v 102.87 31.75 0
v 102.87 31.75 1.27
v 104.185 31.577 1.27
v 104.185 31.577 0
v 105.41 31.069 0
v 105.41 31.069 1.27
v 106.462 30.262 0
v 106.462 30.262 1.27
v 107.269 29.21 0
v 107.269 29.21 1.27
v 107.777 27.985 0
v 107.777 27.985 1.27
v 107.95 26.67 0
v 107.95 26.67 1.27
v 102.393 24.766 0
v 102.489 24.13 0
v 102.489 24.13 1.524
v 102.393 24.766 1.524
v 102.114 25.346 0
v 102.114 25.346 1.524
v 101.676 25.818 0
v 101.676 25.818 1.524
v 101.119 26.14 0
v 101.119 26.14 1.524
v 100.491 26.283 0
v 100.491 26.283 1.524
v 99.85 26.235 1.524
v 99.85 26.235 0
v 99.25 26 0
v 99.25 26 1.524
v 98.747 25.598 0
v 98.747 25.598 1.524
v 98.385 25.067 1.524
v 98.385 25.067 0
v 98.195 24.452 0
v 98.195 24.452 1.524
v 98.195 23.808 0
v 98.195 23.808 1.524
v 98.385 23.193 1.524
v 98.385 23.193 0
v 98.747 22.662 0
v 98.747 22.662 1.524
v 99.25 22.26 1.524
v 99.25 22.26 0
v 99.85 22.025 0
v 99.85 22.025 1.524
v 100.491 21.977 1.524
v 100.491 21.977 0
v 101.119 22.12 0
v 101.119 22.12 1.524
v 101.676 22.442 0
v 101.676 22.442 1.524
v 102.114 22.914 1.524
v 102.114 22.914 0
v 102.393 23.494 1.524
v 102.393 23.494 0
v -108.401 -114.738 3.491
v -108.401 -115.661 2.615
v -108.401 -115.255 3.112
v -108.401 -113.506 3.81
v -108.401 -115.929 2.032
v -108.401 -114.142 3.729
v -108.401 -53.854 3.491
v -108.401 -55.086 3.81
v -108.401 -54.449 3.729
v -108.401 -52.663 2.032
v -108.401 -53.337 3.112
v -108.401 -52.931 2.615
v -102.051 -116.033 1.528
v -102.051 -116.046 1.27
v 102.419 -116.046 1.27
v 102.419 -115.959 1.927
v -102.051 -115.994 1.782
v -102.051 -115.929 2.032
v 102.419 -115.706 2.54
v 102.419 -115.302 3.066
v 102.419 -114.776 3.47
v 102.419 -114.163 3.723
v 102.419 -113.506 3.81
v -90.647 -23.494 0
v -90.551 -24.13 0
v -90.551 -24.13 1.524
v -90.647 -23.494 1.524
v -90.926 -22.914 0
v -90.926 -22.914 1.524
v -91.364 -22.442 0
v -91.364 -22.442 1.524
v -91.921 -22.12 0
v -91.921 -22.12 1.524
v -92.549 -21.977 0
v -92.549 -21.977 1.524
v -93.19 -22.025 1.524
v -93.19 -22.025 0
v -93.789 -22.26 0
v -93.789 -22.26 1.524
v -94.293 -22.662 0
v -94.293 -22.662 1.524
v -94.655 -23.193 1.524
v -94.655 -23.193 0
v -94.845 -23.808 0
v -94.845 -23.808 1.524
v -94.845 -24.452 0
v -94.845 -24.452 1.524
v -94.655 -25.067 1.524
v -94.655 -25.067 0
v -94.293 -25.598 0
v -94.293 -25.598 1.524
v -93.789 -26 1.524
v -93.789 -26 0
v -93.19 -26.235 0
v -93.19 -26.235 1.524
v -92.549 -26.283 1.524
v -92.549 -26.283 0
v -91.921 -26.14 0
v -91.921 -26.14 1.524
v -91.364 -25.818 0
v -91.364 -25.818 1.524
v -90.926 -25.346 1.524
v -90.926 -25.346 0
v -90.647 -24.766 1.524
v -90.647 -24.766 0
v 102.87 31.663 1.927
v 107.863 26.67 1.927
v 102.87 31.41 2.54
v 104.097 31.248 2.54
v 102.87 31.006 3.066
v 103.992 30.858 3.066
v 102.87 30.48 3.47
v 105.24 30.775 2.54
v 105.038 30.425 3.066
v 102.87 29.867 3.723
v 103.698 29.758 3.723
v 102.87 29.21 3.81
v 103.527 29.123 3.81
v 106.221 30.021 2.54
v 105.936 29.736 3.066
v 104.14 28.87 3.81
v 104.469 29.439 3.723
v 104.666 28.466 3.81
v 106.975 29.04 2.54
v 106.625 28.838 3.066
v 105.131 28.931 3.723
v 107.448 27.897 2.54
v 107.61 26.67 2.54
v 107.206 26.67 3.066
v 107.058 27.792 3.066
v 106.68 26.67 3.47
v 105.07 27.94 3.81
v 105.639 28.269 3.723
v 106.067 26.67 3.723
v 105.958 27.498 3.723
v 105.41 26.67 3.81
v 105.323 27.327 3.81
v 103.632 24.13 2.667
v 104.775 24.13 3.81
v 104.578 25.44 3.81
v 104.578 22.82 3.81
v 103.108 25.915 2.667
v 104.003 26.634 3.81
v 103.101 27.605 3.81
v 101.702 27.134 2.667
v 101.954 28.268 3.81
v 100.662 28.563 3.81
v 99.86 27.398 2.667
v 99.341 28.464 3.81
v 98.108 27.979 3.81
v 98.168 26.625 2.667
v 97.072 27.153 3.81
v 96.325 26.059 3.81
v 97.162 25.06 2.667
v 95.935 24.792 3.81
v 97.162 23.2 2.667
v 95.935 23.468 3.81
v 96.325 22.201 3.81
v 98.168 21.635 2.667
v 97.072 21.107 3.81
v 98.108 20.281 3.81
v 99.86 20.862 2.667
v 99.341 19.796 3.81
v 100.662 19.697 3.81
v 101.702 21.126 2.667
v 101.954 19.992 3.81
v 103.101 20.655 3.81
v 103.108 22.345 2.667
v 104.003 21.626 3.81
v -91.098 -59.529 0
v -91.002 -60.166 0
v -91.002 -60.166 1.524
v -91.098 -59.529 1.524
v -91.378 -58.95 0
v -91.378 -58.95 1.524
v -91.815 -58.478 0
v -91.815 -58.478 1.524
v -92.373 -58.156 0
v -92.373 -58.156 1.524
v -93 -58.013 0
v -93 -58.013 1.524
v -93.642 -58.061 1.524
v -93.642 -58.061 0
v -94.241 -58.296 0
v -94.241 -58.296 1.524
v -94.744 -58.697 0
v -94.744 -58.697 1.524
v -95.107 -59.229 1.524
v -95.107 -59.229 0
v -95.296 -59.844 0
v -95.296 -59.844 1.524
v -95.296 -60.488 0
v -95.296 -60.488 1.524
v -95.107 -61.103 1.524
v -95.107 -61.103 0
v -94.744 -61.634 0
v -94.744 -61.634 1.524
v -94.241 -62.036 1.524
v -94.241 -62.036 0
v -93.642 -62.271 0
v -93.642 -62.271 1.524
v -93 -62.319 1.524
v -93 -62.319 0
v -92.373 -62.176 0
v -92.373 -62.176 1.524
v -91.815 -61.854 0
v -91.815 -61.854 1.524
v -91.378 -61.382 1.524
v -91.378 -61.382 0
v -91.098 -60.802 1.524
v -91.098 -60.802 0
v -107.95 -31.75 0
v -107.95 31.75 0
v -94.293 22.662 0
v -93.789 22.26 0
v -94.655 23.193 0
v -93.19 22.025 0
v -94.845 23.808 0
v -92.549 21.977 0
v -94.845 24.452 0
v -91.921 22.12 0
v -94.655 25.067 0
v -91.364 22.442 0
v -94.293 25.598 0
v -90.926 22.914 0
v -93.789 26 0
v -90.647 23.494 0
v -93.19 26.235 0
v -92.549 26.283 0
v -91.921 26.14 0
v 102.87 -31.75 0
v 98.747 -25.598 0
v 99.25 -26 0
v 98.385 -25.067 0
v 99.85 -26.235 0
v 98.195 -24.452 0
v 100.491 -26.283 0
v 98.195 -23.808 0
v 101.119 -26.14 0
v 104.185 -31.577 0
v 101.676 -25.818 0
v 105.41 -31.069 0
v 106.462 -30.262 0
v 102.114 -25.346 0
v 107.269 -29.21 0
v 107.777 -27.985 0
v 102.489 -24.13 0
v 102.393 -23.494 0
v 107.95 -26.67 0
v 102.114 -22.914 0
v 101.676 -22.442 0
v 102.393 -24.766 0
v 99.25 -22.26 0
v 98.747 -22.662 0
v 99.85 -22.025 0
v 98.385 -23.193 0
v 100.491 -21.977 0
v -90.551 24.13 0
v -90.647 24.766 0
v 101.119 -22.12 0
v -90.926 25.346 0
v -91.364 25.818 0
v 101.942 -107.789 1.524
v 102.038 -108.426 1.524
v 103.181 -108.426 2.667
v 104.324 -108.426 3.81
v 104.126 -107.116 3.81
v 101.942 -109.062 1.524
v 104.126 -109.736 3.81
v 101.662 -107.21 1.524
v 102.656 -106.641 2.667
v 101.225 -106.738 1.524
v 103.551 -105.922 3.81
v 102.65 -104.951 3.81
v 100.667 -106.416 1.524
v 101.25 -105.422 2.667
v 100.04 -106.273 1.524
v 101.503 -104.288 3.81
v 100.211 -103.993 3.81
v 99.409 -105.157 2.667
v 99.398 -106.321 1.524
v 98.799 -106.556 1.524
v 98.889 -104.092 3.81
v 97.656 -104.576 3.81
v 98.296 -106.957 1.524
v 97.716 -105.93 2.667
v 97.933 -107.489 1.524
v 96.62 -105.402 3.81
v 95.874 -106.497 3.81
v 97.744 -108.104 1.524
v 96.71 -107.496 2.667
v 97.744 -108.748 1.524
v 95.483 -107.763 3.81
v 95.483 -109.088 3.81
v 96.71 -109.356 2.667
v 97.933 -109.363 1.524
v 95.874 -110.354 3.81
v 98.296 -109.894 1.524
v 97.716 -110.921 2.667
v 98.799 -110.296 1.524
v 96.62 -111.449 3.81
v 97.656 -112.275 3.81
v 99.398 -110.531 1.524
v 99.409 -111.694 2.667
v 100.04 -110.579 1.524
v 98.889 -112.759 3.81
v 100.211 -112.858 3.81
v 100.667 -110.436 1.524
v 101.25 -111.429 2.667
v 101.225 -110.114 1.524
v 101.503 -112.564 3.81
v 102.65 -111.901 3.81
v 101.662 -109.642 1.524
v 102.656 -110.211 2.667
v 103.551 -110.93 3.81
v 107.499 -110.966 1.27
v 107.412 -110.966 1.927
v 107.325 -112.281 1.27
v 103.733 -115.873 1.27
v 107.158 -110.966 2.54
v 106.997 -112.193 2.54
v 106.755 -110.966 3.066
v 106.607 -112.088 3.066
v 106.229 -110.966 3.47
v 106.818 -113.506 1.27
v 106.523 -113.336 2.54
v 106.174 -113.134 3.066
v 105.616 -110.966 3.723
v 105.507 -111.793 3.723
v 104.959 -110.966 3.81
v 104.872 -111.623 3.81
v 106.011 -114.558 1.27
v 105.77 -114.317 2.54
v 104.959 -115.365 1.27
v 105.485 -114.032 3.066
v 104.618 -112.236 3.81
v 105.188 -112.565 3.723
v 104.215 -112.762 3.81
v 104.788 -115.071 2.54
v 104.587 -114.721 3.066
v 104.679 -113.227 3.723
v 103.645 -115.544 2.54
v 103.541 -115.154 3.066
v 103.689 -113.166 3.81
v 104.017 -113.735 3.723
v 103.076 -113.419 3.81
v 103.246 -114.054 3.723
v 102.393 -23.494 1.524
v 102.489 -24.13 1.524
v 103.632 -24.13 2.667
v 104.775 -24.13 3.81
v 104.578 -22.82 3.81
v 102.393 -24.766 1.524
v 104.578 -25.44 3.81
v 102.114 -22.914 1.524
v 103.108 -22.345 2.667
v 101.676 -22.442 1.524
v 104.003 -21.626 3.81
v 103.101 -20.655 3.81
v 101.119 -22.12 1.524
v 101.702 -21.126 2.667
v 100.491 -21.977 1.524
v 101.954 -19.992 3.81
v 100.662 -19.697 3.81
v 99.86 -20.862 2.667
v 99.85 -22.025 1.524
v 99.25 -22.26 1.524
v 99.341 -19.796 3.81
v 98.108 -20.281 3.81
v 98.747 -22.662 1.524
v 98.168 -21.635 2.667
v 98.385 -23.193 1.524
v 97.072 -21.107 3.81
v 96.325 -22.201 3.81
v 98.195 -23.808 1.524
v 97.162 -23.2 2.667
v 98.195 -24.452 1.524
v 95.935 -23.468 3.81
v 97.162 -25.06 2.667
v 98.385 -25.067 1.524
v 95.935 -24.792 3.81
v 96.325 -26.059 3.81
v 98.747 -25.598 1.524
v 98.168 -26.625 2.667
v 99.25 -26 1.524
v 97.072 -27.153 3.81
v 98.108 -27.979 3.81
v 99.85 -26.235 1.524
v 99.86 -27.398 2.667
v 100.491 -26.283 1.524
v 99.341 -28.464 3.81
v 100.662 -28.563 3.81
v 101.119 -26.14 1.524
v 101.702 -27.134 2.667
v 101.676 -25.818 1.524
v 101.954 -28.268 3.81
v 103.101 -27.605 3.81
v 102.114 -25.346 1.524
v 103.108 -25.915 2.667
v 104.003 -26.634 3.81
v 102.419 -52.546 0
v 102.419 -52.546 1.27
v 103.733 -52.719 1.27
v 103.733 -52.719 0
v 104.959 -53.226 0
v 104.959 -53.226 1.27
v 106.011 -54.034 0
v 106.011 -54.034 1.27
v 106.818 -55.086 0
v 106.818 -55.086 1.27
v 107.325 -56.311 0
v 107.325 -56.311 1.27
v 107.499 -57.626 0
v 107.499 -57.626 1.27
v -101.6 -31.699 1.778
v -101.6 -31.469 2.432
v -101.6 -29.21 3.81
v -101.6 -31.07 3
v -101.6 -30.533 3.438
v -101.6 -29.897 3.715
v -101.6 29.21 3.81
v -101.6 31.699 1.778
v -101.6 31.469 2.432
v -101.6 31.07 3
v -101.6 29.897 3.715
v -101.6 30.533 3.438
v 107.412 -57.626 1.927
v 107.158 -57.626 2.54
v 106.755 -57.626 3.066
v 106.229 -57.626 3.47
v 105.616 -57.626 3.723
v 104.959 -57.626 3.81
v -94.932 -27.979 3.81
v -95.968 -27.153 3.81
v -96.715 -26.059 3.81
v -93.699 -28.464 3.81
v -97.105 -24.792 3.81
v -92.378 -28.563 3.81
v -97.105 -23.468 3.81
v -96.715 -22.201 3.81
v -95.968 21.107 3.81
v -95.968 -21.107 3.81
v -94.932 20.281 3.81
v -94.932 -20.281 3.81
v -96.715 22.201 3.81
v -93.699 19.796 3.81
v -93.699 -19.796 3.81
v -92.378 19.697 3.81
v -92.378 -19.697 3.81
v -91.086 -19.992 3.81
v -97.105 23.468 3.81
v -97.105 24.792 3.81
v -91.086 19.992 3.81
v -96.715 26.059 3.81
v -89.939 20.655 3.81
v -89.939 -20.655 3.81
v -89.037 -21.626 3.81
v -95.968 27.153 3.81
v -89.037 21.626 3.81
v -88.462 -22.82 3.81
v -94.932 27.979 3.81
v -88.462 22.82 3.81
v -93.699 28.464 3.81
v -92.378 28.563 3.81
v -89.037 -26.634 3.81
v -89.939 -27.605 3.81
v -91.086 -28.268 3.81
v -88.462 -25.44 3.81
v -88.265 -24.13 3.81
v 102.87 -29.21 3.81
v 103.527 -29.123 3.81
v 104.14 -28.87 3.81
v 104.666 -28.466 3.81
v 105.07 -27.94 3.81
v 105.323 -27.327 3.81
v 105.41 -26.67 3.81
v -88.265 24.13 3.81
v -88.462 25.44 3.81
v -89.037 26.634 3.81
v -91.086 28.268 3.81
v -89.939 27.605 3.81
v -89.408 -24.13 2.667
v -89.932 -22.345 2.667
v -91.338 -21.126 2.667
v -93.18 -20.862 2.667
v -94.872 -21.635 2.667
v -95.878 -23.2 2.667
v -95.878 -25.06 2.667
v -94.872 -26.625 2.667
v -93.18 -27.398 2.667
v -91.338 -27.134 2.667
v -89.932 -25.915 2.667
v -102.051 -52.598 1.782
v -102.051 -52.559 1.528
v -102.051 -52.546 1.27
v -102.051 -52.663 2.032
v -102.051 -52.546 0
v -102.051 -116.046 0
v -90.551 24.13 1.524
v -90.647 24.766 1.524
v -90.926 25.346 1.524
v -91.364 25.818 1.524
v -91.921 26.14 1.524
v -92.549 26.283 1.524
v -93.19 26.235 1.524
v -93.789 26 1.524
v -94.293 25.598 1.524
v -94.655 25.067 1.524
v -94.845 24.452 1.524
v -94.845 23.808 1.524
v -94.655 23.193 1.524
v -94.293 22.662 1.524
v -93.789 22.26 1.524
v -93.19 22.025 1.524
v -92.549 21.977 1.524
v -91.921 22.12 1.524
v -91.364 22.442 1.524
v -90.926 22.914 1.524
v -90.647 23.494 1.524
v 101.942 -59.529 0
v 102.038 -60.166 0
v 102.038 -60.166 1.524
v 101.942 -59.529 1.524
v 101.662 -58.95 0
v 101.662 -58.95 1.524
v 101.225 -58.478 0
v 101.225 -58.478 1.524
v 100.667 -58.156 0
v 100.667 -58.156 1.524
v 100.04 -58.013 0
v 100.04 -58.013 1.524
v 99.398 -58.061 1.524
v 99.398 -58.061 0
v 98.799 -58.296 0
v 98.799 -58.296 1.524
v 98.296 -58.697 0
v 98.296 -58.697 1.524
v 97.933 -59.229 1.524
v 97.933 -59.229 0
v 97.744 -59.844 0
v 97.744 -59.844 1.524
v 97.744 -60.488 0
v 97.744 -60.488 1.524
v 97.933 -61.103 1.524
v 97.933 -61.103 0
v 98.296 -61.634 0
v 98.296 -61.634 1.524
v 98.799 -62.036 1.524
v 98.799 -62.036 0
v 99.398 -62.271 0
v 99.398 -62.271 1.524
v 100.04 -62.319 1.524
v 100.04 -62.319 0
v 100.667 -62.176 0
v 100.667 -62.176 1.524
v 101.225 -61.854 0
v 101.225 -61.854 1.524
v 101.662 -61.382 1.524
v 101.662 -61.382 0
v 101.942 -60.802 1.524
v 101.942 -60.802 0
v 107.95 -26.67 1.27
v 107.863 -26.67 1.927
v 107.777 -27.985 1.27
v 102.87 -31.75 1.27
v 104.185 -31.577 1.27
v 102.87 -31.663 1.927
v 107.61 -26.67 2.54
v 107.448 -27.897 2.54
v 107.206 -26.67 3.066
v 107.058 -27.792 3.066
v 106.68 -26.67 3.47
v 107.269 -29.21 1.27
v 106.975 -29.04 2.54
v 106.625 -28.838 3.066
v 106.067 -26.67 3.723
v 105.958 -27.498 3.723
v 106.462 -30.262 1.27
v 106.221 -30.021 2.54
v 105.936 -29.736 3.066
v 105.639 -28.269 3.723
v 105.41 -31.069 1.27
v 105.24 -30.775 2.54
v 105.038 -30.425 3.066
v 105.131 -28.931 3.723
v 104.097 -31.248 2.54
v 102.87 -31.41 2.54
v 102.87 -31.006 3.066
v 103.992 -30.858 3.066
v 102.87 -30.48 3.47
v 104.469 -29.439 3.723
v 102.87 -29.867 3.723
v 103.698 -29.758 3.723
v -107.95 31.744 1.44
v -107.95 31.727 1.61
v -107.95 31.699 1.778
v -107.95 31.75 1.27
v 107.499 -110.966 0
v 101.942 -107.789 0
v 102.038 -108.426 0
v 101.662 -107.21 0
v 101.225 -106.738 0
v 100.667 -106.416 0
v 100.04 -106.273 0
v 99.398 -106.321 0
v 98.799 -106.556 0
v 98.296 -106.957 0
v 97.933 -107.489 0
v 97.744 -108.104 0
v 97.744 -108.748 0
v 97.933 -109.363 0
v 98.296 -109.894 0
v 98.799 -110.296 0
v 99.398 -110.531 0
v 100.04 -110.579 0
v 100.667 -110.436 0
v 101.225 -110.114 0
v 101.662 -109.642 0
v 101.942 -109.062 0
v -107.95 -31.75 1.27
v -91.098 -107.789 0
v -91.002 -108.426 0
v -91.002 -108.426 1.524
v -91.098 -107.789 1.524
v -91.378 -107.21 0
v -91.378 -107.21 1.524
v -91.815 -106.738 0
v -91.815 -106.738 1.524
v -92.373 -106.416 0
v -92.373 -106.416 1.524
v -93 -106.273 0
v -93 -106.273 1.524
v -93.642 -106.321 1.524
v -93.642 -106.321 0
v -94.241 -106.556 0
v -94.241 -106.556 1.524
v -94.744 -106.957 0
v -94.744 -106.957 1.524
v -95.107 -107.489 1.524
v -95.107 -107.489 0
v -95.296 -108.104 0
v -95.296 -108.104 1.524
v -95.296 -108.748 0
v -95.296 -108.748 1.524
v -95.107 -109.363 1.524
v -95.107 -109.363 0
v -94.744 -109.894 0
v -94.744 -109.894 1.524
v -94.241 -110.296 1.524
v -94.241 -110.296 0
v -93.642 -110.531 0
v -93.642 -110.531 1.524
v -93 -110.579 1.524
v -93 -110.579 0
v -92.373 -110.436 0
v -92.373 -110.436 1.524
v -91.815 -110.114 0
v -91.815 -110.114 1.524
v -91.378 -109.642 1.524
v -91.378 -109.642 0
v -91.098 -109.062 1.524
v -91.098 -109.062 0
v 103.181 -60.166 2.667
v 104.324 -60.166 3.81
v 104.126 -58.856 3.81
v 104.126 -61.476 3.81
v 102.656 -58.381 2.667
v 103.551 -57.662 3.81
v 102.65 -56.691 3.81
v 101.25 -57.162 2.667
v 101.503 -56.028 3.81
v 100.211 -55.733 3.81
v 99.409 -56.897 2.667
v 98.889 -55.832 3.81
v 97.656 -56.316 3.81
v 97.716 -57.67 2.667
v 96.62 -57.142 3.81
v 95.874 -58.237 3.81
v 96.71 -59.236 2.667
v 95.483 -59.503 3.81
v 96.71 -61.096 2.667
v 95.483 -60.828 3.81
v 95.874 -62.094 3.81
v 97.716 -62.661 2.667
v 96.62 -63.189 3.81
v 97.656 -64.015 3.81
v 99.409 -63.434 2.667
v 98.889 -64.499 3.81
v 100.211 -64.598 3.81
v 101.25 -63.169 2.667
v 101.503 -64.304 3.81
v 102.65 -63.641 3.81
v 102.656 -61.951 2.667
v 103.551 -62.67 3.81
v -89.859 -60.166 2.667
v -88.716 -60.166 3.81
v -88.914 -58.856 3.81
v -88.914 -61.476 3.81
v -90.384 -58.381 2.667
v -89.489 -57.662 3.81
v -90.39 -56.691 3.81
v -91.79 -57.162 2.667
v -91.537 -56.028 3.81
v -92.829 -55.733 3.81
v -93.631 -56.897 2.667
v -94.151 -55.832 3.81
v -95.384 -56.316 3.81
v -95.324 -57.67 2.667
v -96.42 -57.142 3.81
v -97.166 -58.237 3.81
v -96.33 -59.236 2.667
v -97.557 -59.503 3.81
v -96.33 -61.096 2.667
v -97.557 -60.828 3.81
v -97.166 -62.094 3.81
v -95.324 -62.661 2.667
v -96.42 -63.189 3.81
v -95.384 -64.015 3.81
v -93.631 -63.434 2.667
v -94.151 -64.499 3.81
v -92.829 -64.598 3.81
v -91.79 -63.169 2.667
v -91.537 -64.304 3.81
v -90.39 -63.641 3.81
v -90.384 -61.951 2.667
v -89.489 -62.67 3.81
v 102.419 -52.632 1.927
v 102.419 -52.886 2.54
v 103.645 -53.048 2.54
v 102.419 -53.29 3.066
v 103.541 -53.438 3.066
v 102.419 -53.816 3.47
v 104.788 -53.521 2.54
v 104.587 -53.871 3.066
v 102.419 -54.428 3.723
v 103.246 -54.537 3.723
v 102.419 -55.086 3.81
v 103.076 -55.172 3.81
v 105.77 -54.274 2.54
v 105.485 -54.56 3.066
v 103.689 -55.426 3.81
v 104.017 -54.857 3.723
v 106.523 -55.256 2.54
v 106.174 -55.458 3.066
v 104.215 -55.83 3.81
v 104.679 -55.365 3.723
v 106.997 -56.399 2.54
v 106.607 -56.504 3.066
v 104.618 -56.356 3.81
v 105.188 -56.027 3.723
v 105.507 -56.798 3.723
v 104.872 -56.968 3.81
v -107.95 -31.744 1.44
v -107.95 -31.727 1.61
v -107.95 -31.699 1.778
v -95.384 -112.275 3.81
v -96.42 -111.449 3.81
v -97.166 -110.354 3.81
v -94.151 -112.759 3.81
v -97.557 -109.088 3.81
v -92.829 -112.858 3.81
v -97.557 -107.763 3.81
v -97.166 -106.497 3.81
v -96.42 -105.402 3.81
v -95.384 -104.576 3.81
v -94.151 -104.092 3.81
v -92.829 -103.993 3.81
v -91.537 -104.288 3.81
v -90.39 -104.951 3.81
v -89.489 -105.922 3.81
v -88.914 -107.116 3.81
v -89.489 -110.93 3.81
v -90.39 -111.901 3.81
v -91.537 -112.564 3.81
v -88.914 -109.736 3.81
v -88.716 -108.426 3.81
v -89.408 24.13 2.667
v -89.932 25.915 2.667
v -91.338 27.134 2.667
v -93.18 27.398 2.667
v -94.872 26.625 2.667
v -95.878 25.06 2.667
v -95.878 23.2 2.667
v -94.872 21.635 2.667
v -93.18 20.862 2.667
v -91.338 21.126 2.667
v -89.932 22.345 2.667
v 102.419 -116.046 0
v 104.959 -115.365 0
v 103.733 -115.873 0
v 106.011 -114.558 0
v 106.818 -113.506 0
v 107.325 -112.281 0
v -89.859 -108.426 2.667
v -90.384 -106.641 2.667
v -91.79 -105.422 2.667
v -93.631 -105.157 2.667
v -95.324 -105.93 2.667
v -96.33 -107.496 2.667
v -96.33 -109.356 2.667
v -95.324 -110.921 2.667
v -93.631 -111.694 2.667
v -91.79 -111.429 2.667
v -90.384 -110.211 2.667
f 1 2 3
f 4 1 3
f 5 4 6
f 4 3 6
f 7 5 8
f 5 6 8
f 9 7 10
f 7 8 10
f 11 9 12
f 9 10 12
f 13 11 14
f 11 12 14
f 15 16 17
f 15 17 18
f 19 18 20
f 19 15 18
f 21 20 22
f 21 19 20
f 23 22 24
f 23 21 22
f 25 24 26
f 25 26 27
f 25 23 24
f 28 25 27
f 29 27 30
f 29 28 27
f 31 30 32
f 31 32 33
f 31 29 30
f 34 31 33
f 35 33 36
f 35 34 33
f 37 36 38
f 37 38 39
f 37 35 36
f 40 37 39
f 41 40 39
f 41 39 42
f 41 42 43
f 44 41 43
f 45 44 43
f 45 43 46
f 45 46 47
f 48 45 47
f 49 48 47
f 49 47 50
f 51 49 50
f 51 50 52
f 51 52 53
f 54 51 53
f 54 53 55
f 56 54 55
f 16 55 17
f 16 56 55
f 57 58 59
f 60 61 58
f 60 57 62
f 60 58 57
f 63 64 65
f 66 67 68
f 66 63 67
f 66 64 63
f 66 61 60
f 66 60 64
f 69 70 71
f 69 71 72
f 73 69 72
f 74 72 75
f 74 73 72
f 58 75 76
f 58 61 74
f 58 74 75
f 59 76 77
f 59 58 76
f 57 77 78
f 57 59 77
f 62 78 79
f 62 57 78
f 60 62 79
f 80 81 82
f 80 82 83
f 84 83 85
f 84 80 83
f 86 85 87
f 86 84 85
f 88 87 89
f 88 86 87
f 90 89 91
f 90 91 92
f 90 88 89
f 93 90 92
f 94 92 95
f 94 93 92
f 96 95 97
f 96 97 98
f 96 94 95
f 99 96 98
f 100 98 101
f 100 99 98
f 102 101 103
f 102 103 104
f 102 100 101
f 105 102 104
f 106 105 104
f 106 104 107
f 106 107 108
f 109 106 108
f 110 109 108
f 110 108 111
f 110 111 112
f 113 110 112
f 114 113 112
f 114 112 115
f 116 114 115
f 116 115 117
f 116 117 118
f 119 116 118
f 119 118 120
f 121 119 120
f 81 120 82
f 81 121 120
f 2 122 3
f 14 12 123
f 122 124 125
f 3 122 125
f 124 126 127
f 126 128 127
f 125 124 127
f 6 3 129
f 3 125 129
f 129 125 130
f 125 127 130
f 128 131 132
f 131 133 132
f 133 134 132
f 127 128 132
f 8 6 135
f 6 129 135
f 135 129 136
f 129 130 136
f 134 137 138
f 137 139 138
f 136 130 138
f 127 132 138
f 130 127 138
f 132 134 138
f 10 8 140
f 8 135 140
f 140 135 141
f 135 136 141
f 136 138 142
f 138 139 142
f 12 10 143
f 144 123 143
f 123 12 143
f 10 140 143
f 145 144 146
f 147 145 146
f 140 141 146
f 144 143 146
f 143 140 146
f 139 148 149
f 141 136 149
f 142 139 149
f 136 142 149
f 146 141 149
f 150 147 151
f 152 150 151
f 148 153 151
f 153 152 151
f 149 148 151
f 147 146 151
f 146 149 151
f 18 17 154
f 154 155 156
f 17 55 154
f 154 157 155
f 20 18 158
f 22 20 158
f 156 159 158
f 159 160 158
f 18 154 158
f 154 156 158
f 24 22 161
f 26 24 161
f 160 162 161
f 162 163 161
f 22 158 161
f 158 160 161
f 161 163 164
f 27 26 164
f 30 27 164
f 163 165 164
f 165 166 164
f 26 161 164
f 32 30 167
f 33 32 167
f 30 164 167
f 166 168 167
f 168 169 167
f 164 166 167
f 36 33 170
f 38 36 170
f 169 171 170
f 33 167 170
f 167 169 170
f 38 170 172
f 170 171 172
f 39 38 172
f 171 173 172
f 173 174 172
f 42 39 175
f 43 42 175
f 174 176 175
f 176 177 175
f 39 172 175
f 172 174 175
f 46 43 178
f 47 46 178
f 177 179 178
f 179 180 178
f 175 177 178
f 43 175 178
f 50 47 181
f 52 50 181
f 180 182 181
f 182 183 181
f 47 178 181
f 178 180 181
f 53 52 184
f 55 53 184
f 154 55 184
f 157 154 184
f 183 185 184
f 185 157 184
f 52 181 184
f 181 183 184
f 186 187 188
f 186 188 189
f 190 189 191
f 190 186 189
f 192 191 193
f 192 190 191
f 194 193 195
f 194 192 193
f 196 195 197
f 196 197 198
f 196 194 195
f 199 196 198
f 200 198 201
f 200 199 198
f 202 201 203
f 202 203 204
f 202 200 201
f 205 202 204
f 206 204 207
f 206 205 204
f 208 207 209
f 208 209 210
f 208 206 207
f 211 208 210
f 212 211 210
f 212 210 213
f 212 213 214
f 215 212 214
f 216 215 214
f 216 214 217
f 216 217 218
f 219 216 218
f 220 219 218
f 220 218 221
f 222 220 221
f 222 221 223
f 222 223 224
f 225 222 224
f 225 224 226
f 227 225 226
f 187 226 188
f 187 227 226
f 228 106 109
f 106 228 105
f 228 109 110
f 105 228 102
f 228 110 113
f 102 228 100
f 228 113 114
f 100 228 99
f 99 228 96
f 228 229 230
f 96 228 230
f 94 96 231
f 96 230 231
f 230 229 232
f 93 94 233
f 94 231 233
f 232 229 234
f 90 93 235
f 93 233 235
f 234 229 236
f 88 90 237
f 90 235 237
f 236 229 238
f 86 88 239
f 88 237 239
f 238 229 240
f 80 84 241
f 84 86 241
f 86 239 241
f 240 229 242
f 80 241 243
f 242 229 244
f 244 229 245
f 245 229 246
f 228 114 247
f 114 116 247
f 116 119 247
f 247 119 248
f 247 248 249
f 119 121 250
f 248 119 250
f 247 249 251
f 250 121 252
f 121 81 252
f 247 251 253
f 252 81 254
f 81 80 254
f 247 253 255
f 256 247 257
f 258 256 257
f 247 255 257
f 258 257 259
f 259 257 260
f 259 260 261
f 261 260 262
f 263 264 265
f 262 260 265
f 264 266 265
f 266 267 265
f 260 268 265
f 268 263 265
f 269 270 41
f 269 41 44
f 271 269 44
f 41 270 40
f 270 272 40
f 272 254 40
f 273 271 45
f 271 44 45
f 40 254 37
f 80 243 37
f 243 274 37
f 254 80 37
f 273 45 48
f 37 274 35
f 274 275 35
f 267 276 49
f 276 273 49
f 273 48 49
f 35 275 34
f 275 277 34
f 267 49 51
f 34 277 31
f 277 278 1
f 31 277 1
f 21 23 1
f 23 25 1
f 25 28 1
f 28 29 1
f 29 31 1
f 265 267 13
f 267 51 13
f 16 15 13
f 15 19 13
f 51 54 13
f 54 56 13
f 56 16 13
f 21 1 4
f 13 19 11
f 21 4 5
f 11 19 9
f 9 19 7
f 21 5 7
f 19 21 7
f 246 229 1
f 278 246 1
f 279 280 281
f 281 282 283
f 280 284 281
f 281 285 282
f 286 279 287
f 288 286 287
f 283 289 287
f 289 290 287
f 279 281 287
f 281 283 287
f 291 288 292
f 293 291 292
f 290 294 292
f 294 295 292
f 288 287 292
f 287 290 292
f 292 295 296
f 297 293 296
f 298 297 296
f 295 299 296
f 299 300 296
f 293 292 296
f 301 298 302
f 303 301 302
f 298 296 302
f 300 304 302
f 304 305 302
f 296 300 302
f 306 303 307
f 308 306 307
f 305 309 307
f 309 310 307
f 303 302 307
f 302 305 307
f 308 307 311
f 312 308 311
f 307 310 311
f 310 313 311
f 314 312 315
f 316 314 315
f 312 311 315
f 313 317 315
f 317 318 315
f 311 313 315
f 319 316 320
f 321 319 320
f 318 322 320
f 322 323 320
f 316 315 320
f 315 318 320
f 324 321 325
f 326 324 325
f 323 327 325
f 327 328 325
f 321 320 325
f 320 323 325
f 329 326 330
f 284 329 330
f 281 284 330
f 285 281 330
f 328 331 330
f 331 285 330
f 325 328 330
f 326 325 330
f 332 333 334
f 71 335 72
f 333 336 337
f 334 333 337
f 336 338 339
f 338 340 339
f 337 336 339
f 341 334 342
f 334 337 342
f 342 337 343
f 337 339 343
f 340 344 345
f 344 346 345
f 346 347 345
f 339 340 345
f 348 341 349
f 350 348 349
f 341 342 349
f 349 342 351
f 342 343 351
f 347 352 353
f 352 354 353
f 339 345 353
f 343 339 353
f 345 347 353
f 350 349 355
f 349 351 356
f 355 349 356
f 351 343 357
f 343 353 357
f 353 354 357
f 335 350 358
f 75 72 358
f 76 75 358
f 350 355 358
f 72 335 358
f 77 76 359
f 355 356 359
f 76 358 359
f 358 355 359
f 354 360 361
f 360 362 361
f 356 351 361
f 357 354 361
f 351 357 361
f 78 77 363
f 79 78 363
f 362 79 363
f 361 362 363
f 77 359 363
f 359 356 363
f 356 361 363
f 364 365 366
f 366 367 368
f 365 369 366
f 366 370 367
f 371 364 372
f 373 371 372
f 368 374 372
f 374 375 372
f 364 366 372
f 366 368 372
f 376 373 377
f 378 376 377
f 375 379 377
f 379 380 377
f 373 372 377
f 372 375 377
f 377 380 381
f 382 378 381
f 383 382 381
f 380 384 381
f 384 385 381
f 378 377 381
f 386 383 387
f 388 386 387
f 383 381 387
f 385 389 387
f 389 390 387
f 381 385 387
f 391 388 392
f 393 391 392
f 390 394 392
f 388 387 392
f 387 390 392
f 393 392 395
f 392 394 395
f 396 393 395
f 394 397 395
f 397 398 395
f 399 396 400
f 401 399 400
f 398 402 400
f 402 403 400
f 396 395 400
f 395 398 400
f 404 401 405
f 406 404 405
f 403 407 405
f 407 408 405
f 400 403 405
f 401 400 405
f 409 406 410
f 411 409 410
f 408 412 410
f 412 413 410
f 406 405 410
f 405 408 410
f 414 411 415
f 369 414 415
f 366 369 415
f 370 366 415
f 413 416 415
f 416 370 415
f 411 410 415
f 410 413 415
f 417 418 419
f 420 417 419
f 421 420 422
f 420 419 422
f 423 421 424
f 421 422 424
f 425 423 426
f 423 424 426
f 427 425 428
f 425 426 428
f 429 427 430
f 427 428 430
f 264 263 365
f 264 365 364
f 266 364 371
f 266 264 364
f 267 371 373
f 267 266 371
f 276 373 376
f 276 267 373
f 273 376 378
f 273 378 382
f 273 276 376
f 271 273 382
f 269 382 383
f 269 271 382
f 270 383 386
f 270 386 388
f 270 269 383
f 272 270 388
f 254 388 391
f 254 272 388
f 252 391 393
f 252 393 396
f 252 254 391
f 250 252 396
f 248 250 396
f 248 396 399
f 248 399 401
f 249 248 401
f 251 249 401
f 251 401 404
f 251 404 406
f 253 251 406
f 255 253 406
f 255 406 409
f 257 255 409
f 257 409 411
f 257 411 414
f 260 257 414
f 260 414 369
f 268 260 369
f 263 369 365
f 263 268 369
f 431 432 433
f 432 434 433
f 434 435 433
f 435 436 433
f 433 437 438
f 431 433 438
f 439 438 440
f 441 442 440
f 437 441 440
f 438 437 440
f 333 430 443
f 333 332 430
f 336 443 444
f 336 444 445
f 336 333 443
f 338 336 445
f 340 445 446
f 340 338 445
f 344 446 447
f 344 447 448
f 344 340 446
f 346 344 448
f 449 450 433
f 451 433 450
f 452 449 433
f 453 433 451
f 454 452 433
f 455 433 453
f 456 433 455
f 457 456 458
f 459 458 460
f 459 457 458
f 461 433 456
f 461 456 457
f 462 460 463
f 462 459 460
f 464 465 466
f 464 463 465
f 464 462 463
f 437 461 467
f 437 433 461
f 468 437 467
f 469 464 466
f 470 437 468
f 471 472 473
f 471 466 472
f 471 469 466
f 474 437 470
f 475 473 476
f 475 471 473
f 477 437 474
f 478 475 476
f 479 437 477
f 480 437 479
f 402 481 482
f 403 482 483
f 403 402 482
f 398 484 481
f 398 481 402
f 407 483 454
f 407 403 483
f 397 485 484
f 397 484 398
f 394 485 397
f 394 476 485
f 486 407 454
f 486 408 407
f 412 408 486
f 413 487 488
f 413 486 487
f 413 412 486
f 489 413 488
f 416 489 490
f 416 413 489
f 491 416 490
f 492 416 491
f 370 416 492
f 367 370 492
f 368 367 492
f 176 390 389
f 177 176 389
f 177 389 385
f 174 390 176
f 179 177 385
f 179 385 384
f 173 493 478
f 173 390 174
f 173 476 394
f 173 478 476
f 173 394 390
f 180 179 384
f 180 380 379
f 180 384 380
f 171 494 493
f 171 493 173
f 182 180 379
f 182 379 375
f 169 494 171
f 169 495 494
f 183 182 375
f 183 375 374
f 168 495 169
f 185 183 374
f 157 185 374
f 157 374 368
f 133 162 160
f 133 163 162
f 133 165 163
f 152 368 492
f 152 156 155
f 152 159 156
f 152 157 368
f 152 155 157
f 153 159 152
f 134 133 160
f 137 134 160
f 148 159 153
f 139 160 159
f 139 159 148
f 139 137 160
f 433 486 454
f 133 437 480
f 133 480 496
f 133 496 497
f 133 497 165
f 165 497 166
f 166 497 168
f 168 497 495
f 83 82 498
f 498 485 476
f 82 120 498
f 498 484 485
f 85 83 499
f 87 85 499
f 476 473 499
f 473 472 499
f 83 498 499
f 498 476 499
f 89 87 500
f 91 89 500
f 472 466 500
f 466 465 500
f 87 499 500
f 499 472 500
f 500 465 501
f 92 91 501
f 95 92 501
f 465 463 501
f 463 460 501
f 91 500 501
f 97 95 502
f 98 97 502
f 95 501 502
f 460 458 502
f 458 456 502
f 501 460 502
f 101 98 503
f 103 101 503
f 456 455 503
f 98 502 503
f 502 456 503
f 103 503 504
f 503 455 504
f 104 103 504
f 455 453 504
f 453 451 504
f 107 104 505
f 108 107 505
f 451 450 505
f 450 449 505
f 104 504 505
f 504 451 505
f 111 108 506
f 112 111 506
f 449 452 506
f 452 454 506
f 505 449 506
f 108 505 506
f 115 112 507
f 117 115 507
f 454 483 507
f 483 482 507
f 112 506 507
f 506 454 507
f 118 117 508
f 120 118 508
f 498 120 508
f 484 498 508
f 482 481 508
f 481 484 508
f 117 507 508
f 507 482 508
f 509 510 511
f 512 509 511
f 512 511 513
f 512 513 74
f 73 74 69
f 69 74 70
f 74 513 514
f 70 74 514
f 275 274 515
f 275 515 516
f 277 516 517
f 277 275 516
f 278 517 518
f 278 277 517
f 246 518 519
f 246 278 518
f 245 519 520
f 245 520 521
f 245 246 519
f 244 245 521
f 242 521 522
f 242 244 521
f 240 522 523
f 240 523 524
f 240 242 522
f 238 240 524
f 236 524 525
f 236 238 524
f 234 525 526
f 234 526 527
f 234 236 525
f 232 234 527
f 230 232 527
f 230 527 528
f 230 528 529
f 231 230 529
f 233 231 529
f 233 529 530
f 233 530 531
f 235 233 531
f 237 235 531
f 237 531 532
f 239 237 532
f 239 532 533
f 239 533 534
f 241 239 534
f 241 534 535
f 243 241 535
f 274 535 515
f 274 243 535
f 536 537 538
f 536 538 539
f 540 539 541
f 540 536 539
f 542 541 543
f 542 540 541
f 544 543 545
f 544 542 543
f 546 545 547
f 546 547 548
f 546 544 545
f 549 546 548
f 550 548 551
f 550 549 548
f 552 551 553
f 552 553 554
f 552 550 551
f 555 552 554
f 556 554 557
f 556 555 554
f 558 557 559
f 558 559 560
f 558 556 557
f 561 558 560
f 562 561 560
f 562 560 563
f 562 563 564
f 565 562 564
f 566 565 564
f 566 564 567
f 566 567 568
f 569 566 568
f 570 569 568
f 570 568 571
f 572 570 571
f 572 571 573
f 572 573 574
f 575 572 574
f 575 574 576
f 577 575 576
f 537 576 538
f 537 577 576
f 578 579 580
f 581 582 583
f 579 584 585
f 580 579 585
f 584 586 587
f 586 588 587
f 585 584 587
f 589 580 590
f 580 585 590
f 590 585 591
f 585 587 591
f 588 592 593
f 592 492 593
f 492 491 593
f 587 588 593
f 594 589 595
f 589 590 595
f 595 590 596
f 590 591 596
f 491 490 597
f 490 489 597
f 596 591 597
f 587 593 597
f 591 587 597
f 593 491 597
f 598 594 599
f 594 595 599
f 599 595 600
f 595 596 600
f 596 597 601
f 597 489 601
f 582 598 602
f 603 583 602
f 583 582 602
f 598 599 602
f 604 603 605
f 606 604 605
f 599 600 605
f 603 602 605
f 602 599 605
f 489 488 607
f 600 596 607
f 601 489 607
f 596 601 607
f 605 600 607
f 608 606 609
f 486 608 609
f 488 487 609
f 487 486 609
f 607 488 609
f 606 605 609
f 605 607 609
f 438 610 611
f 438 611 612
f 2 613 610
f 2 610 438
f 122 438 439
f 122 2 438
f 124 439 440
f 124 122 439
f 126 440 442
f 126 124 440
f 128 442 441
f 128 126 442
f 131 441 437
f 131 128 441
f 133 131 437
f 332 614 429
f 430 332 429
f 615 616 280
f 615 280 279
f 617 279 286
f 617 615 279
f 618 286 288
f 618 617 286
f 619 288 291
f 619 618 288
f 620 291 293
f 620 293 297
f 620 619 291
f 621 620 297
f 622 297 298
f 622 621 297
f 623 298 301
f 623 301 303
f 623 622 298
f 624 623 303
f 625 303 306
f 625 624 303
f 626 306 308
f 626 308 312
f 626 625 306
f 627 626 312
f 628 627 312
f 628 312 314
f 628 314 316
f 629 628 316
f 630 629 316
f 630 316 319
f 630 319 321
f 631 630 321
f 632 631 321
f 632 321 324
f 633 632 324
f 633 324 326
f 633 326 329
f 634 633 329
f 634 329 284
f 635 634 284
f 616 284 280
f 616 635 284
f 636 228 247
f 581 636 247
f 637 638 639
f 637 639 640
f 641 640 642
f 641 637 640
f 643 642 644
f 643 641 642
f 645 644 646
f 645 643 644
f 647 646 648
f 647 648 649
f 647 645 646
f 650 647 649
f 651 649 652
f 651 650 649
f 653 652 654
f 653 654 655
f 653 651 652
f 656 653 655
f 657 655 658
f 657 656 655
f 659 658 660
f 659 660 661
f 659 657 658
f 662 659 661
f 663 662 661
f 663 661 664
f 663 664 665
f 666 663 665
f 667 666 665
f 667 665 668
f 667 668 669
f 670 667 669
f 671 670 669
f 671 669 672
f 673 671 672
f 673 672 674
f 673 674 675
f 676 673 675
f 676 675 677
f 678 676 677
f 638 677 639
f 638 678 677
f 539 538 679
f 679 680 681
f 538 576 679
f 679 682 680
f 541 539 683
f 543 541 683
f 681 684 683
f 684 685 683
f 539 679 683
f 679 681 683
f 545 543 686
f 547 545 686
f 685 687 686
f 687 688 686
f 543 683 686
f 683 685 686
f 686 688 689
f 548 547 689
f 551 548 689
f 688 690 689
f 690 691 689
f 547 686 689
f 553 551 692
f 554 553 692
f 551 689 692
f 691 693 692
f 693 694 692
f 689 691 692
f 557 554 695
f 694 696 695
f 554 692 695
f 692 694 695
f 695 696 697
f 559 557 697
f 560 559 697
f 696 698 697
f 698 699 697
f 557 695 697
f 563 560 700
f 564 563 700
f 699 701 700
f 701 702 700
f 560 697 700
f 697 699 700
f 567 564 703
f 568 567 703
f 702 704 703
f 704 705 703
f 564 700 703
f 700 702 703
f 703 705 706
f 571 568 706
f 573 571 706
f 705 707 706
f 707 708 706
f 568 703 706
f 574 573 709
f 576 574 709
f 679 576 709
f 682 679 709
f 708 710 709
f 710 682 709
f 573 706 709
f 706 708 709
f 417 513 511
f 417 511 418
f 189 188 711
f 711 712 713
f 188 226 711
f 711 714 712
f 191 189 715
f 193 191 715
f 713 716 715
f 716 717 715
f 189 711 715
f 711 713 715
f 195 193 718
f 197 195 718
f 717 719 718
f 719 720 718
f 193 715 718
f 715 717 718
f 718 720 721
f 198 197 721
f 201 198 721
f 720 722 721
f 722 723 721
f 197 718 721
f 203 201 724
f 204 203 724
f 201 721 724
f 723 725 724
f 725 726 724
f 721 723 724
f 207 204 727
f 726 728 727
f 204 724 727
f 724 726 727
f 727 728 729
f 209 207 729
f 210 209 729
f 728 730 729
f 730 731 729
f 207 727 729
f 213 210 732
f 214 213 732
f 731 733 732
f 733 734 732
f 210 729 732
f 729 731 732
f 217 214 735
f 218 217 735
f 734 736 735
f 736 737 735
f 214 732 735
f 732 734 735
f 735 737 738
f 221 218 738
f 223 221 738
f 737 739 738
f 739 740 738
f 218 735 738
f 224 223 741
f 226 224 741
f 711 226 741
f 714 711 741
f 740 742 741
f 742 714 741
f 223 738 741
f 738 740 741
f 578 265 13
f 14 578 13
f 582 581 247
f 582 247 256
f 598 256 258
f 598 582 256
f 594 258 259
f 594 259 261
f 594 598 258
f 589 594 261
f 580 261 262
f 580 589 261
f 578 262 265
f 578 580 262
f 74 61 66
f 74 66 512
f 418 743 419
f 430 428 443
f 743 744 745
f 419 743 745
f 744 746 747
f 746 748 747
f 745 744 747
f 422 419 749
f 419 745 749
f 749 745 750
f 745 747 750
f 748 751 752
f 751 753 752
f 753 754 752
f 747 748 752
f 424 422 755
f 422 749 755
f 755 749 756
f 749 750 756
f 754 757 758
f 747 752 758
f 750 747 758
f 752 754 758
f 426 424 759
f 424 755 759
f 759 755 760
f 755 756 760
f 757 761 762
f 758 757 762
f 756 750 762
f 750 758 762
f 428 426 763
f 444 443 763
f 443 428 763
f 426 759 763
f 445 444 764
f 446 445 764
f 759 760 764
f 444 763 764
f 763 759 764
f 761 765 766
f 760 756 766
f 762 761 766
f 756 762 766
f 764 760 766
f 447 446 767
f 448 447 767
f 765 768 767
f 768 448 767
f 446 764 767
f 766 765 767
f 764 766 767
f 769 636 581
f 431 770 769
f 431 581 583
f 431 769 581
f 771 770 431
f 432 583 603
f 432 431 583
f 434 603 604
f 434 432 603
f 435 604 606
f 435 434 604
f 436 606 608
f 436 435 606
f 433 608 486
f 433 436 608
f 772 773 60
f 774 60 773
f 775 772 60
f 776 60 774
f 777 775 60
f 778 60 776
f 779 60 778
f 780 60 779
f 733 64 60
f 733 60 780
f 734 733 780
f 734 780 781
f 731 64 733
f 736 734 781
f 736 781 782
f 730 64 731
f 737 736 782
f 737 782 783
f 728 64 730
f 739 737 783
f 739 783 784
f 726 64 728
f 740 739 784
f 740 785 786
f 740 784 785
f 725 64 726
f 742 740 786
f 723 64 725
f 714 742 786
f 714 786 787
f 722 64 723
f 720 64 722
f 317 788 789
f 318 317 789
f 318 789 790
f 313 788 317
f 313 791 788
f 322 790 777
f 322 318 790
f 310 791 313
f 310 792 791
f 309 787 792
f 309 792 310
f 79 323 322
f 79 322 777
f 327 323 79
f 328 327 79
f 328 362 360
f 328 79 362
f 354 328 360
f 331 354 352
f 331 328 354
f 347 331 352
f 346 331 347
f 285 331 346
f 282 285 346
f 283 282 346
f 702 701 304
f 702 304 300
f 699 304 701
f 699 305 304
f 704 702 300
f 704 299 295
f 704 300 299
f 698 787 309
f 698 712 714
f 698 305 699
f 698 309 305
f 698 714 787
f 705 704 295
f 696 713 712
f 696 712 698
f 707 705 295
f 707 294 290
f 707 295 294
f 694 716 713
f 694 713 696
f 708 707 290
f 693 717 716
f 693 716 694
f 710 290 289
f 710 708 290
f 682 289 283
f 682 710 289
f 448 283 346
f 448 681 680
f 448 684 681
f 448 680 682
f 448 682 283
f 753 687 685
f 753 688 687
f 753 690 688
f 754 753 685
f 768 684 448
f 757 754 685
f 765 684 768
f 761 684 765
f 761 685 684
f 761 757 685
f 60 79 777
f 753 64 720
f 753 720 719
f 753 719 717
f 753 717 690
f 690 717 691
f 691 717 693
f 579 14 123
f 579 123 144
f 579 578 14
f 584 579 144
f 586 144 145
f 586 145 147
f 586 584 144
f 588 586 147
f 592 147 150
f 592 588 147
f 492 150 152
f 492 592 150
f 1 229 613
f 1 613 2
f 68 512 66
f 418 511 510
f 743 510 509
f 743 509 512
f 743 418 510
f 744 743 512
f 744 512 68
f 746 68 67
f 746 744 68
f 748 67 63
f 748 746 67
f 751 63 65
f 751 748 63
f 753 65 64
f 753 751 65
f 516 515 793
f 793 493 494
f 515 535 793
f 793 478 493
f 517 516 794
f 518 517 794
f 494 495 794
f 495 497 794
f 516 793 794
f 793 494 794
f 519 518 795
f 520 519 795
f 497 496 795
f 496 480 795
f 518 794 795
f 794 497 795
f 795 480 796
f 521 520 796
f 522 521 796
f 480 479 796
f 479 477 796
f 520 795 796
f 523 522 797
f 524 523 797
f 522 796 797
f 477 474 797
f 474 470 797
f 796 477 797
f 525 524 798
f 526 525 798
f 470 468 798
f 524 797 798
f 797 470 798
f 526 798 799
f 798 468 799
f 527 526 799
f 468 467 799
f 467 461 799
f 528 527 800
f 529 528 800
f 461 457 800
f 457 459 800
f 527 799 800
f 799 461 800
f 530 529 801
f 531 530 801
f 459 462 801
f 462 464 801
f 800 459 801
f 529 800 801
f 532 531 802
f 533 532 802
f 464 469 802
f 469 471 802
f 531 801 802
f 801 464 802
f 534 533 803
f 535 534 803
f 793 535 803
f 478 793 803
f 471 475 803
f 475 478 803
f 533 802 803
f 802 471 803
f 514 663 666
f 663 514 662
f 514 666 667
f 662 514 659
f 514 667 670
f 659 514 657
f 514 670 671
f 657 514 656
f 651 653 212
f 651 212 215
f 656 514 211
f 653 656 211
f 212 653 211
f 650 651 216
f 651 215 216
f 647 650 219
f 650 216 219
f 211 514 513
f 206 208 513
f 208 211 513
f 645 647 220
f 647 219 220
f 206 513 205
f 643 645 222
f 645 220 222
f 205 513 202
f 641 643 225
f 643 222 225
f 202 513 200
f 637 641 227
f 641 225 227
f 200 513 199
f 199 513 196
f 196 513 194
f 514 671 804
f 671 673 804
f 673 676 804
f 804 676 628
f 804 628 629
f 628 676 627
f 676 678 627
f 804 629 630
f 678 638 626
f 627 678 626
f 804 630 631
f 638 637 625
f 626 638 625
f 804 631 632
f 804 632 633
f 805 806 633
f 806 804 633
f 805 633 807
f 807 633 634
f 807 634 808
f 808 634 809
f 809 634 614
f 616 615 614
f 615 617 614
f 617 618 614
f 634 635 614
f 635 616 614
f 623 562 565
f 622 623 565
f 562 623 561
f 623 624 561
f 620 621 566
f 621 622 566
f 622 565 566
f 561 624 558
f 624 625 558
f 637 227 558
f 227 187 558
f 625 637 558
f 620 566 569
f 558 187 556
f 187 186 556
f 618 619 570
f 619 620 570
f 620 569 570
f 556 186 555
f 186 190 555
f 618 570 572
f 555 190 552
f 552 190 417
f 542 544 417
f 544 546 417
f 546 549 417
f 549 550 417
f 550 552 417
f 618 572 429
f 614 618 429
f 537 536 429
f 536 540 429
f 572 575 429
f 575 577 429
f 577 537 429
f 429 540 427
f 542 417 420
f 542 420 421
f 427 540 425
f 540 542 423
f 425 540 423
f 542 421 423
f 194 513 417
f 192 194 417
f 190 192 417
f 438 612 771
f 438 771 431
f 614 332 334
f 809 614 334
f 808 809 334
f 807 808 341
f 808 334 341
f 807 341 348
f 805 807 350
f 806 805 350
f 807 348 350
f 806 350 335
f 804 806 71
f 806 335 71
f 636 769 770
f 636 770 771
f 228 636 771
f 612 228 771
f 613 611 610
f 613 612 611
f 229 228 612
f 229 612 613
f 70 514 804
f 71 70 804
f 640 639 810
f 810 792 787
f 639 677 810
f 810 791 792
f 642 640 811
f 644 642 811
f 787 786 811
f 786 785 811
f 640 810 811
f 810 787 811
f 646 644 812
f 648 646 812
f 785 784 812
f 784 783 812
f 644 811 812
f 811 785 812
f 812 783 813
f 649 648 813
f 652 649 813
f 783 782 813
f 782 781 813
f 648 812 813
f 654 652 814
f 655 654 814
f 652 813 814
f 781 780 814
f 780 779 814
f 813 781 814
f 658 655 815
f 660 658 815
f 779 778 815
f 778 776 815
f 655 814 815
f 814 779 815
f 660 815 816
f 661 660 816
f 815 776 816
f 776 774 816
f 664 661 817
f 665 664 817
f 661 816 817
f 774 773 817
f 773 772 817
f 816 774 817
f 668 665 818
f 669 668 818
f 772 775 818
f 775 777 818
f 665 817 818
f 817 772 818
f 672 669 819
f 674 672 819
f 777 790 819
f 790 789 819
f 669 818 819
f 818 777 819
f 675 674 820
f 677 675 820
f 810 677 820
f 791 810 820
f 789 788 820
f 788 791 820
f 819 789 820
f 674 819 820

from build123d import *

# Parameters (mm, degrees)
F0_W     = 215.9
F0_H     = 63.5
F0_R     = 2.159
F1_DEPTH = 3.81
F2_W     = 6.35
F2_H     = 63.5
F3_DEPTH = 2.032
F4_SIZE  = 2.286
F5_W     = 215.9
F5_H     = 63.5
F5_R     = 2.159
F6_DEPTH = 3.81
F7_SIZE  = 2.286
F8_W     = 6.35
F8_H     = 63.5
F9_DEPTH = 2.032
F10_R    = 5.08
F10_2_R  = 5.08
F11_R    = 2.54
F11_2_R  = 2.54


with BuildPart() as f1:
    # F0 (on Top) → F1 (new body)
    with BuildSketch(Plane.XY):
        Rectangle(F0_W, F0_H)
        with Locations((-92.71, -24.13)):
            Circle(F0_R, mode=Mode.SUBTRACT)
        with Locations((100.33, -24.13)):
            Circle(F0_R, mode=Mode.SUBTRACT)
        with Locations((-92.71, 24.13)):
            Circle(F0_R, mode=Mode.SUBTRACT)
        with Locations((100.33, 24.13)):
            Circle(F0_R, mode=Mode.SUBTRACT)
    extrude(amount=F1_DEPTH)

    # F2 (on face) → F3 (cut)
    with BuildSketch(Plane.XY.offset(3.81)):
        with Locations((-104.775, 0)):
            Rectangle(F2_W, F2_H)
    extrude(amount=-F3_DEPTH, mode=Mode.SUBTRACT)

    # F4
    f4_edges = [f1.edges().sort_by_distance(p)[0] for p in [
        (-94.869, 24.13, 3.81),
        (-94.869, -24.13, 3.81),
        (98.171, 24.13, 3.81),
        (98.171, -24.13, 3.81),
    ]]
    chamfer(f4_edges, length=F4_SIZE)

    # F10
    f10_edges = [f1.edges().sort_by_distance(p)[0] for p in [
        (107.95, 31.75, 1.905),
        (107.95, -31.75, 1.905),
    ]]
    fillet(f10_edges, radius=F10_R)

    # F11
    f11_edges = [f1.edges().sort_by_distance(p)[0] for p in [
        (0.635, 31.75, 3.81),
    ]]
    fillet(f11_edges, radius=F11_R)


with BuildPart() as f6:
    # F5 (on Top) → F6 (new body)
    with BuildSketch(Plane.XY):
        with Locations((-0.451418, -84.295818)):
            Rectangle(F5_W, F5_H)
        with Locations((-93.161418, -108.425818)):
            Circle(F5_R, mode=Mode.SUBTRACT)
        with Locations((99.878582, -108.425818)):
            Circle(F5_R, mode=Mode.SUBTRACT)
        with Locations((-93.161418, -60.165818)):
            Circle(F5_R, mode=Mode.SUBTRACT)
        with Locations((99.878582, -60.165818)):
            Circle(F5_R, mode=Mode.SUBTRACT)
    extrude(amount=F6_DEPTH)

    # F7
    f7_edges = [f6.edges().sort_by_distance(p)[0] for p in [
        (-95.320418, -60.165818, 3.81),
        (97.719582, -60.165818, 3.81),
        (97.719582, -108.425818, 3.81),
        (-95.320418, -108.425818, 3.81),
    ]]
    chamfer(f7_edges, length=F7_SIZE)

    # F8 (on face) → F9 (cut)
    with BuildSketch(Plane(origin=(0, 0, 0), x_dir=(1, 0, 0), z_dir=(0, 0, -1))):
        with Locations((-105.226418, 84.295818)):
            Rectangle(F8_W, F8_H)
    extrude(amount=-F9_DEPTH, mode=Mode.SUBTRACT)

    # F10#2
    f10_2_edges = [f6.edges().sort_by_distance(p)[0] for p in [
        (107.498582, -116.045818, 1.905),
        (107.498582, -52.545818, 1.905),
    ]]
    fillet(f10_2_edges, radius=F10_2_R)

    # F11#2
    f11_2_edges = [f6.edges().sort_by_distance(p)[0] for p in [
        (-2.991418, -52.545818, 3.81),
    ]]
    fillet(f11_2_edges, radius=F11_2_R)


solid = Compound([f1.part, f6.part])
